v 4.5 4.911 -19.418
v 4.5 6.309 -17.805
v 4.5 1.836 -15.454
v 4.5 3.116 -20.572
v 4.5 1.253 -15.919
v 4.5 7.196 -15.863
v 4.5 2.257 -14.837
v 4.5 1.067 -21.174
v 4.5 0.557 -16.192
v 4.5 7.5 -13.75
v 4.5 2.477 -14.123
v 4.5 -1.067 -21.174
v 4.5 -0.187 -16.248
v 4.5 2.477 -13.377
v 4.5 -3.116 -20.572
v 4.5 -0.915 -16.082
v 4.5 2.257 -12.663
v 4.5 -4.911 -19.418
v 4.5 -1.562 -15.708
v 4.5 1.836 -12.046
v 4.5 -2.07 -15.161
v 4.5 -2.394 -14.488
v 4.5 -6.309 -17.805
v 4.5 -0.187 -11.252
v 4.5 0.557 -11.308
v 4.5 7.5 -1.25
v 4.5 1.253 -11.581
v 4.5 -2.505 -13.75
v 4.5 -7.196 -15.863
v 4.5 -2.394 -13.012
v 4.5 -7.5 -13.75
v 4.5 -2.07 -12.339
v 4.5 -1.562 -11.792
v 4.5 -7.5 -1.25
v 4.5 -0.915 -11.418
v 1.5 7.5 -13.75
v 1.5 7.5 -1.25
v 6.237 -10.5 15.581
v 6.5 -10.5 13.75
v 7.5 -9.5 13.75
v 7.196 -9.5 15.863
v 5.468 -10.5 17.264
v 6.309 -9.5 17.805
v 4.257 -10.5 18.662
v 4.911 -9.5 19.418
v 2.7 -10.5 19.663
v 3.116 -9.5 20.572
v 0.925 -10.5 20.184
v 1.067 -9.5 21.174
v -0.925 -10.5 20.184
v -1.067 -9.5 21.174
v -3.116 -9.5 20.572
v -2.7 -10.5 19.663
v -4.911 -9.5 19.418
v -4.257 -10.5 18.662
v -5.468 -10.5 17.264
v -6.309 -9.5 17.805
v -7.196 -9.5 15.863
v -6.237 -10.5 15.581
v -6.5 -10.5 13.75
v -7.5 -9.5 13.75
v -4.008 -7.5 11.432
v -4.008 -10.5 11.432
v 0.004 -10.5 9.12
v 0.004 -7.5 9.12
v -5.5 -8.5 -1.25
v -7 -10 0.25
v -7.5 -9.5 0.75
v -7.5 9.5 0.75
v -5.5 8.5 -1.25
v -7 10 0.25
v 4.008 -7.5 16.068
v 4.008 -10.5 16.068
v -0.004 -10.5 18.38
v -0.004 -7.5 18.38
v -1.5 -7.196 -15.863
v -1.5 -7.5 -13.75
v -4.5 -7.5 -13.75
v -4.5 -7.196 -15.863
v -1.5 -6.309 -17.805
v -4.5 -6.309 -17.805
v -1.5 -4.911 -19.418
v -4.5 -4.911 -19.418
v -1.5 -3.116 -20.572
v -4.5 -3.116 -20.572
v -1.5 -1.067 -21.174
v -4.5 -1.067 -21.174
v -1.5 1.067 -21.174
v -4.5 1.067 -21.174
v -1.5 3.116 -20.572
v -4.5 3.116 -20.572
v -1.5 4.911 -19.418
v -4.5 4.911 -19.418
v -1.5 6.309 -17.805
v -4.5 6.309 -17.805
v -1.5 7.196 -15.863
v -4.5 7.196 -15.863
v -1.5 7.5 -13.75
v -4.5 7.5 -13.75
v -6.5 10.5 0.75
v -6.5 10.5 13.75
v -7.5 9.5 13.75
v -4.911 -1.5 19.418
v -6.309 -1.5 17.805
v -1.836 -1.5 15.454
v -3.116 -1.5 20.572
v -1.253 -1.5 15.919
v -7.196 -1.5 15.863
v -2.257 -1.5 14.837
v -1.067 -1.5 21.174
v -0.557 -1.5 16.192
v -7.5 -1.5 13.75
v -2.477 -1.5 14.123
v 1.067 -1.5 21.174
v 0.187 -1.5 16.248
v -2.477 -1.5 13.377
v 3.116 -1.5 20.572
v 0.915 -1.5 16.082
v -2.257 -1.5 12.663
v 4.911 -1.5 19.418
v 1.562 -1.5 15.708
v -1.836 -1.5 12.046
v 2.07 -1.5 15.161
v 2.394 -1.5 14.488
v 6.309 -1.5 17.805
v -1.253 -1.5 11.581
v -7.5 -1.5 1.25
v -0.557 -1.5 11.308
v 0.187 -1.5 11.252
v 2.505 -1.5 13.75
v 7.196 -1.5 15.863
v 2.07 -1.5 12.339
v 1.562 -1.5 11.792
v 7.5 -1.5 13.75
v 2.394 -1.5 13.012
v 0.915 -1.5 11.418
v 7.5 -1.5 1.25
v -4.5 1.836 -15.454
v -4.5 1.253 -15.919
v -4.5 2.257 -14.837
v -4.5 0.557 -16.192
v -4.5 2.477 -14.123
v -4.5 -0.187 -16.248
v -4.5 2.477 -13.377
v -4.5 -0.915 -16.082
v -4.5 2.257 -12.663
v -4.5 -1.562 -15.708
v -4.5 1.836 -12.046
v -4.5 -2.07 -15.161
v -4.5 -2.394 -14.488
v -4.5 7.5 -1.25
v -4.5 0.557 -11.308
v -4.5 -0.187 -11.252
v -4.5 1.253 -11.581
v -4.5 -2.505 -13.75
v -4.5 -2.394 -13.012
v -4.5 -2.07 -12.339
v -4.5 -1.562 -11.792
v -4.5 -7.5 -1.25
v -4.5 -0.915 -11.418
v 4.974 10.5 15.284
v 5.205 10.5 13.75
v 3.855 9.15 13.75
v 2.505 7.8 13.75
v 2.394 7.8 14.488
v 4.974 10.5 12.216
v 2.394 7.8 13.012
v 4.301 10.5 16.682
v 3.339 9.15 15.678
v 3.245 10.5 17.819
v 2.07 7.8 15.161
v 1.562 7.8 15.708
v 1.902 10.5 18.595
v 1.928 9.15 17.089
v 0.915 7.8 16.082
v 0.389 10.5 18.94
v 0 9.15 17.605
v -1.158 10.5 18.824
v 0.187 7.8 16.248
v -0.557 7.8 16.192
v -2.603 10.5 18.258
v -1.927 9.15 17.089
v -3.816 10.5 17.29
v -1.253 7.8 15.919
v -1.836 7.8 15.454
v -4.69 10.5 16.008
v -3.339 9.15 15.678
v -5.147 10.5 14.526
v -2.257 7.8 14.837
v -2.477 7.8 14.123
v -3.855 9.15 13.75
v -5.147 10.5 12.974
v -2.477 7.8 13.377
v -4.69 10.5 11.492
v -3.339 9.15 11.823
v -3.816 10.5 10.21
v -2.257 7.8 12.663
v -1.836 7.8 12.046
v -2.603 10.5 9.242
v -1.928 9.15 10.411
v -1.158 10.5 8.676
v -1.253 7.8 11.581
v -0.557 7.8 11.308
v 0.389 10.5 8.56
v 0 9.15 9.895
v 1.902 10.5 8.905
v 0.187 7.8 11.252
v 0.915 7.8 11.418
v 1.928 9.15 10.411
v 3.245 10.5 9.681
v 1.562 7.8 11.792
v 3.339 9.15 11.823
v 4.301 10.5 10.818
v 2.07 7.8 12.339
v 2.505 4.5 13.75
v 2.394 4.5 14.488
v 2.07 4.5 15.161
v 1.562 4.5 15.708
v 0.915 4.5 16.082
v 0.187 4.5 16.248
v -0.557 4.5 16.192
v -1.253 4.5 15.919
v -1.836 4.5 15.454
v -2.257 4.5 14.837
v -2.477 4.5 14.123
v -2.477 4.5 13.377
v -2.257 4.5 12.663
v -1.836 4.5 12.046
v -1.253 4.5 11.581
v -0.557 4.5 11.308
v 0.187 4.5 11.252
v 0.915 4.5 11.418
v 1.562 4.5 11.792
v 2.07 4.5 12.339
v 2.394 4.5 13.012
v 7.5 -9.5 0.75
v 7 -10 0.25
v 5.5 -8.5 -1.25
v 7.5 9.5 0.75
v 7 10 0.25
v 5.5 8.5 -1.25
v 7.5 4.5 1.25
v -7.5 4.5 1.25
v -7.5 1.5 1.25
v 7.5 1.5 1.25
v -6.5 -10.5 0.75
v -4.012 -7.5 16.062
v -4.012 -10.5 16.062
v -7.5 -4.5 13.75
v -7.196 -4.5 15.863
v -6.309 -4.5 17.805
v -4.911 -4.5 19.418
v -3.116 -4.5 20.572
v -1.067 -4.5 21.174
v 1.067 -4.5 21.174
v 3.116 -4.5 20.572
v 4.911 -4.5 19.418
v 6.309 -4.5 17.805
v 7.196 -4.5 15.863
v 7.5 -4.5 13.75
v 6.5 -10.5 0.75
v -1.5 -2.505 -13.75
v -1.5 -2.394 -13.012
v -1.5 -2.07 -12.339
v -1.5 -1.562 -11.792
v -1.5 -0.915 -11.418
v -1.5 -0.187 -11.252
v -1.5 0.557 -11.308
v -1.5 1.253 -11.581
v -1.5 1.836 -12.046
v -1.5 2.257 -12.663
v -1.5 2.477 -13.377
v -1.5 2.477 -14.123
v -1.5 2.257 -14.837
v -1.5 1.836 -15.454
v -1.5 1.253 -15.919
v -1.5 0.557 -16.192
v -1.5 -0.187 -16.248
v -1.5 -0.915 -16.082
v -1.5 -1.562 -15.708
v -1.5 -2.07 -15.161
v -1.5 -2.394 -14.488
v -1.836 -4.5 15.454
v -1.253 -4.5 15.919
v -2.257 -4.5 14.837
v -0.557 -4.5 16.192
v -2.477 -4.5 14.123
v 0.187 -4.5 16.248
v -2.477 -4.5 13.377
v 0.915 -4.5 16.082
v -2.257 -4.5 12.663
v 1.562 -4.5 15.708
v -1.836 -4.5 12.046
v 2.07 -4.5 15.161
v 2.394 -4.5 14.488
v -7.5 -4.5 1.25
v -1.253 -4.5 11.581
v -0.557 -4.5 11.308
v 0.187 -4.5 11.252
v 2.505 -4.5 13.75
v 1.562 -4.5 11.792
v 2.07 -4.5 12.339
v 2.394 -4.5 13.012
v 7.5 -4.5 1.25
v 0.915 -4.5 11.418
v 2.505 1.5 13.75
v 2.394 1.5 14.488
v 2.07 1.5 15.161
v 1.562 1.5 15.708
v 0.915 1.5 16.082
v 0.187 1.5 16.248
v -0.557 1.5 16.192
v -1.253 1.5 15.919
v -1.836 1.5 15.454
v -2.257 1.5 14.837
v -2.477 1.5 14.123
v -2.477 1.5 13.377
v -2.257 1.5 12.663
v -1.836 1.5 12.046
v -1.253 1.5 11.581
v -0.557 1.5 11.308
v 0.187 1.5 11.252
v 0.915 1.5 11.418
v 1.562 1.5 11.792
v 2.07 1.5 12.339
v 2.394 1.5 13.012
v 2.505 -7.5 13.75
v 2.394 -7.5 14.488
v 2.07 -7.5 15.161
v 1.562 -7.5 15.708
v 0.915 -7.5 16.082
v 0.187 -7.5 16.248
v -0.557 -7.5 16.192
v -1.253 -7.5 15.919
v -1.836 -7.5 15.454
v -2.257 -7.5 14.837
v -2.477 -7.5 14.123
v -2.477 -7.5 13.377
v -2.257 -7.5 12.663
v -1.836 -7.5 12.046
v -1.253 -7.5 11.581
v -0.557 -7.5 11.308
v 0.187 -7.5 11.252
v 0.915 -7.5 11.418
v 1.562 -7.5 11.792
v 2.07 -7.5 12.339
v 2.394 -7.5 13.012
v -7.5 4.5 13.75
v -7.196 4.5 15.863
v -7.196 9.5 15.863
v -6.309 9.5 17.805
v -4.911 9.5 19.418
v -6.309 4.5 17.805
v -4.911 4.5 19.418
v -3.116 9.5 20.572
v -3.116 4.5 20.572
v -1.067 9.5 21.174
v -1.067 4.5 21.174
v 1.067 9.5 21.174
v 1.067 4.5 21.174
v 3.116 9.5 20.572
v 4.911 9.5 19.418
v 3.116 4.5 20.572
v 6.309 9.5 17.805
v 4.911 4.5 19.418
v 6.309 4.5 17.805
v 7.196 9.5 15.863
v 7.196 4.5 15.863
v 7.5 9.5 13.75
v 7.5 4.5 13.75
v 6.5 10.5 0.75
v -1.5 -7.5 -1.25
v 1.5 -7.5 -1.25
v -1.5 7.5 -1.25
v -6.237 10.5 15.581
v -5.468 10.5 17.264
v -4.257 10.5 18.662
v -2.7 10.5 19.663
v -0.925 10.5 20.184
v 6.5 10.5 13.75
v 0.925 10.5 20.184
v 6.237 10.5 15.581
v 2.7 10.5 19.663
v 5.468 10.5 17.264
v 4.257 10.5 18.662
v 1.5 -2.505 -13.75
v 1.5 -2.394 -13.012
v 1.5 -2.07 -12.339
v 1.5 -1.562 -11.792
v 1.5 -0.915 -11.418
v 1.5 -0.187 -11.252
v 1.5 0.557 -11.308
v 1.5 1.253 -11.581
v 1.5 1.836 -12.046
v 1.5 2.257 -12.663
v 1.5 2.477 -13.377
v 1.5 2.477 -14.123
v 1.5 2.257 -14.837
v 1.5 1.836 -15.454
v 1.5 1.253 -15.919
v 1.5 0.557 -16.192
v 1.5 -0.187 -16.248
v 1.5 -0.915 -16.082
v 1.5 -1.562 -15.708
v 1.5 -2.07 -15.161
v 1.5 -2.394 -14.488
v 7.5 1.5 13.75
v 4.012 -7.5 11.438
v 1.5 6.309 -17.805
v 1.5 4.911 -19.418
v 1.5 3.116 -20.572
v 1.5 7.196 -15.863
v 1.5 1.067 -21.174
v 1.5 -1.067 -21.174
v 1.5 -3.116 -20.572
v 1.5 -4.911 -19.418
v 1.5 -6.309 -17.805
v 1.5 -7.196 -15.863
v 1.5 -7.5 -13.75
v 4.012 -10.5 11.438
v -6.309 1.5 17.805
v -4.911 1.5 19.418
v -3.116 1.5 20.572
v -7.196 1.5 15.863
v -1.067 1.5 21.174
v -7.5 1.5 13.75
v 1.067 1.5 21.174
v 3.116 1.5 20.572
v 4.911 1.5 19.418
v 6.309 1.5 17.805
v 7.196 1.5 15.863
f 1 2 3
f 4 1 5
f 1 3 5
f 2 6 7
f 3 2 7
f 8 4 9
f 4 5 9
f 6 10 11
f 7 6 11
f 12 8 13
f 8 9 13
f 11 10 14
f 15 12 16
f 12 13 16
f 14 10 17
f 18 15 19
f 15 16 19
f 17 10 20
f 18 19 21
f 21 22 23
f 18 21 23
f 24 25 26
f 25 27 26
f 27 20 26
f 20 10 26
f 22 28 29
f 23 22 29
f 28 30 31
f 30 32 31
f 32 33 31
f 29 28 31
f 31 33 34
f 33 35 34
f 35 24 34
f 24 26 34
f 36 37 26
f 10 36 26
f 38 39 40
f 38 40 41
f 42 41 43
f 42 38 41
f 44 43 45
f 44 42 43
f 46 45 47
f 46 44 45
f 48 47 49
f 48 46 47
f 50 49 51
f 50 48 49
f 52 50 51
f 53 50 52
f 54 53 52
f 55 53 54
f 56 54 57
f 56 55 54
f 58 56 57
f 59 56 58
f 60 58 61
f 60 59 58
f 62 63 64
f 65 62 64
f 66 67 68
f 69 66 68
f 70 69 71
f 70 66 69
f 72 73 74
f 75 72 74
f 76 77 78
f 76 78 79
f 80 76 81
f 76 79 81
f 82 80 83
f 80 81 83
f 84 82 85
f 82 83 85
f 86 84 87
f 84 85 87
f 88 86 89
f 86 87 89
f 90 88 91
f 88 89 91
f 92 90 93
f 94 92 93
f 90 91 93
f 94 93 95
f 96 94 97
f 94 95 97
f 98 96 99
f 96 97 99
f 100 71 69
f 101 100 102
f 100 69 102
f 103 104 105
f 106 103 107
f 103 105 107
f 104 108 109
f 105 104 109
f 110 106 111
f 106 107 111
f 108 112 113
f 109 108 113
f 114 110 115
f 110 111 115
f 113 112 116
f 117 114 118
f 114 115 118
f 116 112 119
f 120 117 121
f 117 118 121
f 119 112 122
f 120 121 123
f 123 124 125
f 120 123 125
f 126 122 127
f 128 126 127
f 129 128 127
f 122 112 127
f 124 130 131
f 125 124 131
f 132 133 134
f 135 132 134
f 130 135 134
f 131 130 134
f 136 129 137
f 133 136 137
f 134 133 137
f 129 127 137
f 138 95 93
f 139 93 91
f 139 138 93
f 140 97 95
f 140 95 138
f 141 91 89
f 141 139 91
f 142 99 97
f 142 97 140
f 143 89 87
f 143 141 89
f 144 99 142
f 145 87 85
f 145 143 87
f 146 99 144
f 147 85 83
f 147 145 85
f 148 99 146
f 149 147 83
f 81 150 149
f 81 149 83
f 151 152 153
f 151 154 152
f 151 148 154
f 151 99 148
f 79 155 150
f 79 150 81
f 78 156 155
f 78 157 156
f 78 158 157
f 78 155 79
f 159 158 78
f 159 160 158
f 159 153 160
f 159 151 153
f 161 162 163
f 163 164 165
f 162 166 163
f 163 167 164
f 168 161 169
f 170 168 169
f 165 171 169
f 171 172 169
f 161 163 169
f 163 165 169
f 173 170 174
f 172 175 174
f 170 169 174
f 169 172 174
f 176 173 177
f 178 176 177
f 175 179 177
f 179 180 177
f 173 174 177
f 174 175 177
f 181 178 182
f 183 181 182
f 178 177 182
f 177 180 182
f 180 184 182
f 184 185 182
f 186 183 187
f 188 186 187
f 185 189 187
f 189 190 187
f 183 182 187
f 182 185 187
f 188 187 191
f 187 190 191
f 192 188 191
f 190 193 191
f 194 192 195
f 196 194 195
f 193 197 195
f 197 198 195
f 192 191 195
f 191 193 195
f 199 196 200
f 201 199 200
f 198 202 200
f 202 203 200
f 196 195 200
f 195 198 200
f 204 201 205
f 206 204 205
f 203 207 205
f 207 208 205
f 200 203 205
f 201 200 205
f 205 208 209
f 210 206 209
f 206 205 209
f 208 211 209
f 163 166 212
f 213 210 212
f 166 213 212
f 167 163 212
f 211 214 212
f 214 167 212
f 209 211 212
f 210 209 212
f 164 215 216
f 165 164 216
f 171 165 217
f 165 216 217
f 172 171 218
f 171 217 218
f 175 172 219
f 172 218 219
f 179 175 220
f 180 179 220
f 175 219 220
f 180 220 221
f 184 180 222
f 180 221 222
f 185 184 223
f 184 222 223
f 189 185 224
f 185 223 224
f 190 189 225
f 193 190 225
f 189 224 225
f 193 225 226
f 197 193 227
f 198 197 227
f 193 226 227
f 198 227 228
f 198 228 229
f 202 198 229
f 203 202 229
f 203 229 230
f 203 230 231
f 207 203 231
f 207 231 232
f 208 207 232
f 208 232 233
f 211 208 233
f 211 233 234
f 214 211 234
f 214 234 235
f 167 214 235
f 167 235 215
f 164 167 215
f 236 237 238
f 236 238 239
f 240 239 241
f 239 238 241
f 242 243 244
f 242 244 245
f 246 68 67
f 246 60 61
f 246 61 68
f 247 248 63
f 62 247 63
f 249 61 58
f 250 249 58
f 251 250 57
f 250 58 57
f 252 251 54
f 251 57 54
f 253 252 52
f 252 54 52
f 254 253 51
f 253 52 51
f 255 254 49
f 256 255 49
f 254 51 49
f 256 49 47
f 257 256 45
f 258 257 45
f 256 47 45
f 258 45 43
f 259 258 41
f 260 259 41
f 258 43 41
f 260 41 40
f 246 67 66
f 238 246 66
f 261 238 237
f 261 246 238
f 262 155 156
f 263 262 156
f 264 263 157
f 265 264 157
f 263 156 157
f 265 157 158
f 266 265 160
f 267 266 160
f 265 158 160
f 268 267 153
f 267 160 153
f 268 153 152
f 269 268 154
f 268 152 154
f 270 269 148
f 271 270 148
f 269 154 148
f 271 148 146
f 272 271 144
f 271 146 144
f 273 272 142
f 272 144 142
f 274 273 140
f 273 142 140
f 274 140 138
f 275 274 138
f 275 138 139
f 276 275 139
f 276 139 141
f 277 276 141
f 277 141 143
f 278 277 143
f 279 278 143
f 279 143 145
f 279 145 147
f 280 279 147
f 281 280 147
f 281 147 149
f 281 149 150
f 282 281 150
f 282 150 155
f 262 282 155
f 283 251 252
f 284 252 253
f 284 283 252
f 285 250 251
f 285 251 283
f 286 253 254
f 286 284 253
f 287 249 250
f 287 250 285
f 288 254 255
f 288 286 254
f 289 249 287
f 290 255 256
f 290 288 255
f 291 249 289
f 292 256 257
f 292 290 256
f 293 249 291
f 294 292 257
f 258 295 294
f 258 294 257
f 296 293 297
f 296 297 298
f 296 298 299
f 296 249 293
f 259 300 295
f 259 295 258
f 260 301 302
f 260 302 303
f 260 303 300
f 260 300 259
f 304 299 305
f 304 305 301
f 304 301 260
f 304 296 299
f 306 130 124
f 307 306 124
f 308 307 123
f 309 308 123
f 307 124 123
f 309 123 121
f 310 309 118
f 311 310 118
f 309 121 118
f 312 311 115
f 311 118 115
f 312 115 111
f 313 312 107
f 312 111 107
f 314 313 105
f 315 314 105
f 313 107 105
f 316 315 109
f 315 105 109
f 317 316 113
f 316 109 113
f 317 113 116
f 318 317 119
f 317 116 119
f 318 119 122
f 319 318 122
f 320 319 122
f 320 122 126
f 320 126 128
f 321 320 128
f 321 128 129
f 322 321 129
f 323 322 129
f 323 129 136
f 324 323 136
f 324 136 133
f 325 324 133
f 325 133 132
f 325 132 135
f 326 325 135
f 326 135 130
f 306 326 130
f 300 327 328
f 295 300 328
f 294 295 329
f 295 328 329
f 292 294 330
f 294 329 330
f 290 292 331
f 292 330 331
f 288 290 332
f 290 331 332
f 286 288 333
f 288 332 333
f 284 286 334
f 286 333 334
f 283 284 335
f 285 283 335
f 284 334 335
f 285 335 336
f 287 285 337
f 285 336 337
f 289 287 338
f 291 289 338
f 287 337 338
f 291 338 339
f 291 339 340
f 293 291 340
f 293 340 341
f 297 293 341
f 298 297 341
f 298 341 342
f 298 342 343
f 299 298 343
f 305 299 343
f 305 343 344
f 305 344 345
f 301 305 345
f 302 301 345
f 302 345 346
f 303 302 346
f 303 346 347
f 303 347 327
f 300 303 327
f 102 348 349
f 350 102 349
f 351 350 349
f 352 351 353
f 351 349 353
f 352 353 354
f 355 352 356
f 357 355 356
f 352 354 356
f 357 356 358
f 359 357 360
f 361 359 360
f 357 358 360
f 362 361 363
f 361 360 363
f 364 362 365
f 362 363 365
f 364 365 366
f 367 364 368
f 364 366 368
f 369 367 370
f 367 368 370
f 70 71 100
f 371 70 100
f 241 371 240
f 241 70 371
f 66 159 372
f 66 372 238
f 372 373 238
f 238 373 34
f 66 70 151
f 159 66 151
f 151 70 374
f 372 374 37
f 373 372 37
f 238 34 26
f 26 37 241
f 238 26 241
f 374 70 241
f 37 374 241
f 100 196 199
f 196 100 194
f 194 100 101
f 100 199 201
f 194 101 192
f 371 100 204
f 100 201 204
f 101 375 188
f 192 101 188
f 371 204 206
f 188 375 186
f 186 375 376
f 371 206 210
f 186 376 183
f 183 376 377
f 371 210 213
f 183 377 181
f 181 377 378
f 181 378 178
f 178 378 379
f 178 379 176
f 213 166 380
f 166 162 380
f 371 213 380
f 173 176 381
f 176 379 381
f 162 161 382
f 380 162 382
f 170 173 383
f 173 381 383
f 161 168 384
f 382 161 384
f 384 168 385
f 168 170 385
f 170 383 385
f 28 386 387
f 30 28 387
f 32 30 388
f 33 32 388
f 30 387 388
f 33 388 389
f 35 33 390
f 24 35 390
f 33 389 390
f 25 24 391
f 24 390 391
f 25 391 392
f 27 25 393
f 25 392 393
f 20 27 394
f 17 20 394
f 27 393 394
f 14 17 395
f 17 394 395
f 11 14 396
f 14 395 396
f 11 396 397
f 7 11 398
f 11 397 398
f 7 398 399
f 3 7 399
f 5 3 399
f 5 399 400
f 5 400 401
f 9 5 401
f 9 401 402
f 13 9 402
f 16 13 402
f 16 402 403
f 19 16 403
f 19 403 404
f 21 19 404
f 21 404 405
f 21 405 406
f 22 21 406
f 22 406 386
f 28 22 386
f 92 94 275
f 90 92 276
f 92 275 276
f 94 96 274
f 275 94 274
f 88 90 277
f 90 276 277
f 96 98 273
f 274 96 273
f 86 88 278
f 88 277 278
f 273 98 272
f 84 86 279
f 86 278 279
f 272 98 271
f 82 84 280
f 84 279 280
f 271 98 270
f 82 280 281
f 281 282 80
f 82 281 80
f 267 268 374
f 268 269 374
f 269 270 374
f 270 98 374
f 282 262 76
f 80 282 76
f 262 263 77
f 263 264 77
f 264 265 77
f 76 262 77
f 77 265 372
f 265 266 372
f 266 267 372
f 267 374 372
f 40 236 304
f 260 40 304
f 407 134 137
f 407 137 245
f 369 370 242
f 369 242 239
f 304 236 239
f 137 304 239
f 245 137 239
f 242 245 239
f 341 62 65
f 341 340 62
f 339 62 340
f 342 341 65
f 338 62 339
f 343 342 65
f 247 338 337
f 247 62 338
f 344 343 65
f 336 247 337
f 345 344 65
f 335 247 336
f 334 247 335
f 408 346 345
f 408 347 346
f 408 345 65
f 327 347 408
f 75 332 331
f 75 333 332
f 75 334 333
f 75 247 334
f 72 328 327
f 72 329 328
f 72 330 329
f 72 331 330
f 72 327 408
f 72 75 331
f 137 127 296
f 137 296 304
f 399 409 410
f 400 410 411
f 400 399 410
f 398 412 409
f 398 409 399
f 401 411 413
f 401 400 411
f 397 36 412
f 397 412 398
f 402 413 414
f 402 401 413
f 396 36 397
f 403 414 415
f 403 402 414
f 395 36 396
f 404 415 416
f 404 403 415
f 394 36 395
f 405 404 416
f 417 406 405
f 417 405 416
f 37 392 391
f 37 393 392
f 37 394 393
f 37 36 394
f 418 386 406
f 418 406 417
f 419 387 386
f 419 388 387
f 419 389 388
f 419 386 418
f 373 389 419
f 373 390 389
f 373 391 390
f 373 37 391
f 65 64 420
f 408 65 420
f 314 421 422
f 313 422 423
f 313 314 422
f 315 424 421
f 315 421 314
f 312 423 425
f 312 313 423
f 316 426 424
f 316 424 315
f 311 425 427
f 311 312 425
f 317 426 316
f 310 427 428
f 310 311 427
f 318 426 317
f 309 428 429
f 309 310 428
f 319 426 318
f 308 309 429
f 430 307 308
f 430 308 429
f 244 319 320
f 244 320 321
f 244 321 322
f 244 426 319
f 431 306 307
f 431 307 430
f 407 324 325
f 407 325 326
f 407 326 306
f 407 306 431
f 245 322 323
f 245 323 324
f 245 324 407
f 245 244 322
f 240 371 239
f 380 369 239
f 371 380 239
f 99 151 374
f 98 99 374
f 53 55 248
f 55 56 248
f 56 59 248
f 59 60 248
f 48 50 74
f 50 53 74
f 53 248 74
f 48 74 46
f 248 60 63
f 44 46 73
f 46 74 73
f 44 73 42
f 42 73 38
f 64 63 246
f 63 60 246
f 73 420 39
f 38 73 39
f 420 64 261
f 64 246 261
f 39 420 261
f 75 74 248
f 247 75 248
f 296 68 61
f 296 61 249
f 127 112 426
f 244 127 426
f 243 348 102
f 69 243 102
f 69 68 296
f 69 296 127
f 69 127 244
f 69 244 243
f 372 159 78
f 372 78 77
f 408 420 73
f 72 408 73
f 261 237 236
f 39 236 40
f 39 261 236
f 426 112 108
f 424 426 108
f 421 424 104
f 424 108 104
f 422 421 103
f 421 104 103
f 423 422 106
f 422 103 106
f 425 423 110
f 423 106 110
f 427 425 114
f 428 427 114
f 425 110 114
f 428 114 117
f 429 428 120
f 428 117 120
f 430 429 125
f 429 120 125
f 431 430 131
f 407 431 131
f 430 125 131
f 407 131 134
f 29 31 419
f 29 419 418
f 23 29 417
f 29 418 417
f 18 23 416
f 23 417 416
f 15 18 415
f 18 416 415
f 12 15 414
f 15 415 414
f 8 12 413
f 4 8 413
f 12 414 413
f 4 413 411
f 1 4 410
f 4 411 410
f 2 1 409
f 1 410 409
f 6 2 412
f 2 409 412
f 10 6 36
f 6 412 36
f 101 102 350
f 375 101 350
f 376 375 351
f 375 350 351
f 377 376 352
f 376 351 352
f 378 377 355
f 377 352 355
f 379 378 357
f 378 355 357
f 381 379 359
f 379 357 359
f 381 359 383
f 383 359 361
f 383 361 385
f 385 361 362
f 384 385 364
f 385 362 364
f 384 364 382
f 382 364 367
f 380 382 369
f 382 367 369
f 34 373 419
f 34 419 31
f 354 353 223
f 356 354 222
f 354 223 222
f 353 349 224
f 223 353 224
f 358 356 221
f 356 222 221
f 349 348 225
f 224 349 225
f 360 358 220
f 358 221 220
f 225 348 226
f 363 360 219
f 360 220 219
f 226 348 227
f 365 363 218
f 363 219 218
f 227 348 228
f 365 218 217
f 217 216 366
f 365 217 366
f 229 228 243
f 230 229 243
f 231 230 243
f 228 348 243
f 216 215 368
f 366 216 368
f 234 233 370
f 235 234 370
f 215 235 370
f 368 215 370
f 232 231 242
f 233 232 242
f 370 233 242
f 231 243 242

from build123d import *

# Parameters (mm, degrees)
F0_W      = 15
F0_H      = 21
F1_DEPTH  = 1.25
F2_W      = 15
F2_H      = 6
F2_H_2    = 3
F3_DEPTH  = 20
F4_W      = 3
F4_H      = 15
F5_DEPTH  = 20
F6_R      = 2.505
F7_DEPTH  = 25
F8_R      = 2.505
F9_DEPTH  = 25
F10_SIZE  = 2
F11_DEPTH = 3
F12_SIZE  = 2.7
F13_SIZE  = 1


with BuildPart() as f1:
    # F0 (on Top) → F1 (new body, symmetric)
    with BuildSketch(Plane.XY):
        Rectangle(F0_W, F0_H)
    extrude(amount=F1_DEPTH, both=True)

    # F2 (on face) → F3 (join)
    with BuildSketch(Plane.XY.offset(1.25)):
        with Locations((0, -7.5)):
            Rectangle(F2_W, F2_H)
        Rectangle(F2_W, F2_H_2)
        with Locations((0, 7.5)):
            Rectangle(F2_W, F2_H)
    extrude(amount=F3_DEPTH)

    # F4 (on face) → F5 (join)
    with BuildSketch(Plane(origin=(0, 0, -1.25), x_dir=(1, 0, 0), z_dir=(0, 0, -1))):
        with Locations((-3, 0)):
            Rectangle(F4_W, F4_H)
        with Locations((3, 0)):
            Rectangle(F4_W, F4_H)
    extrude(amount=F5_DEPTH)

    # F6 (on face) → F7 (cut)
    with BuildSketch(Plane.XZ.offset(10.5)):
        with BuildLine():
            ThreePointArc((0, 21.25), (5.3033008589, 19.0533008589), (7.5, 13.75))
            Line((7.5, 13.75), (7.5, 21.25))
            Line((7.5, 21.25), (0, 21.25))
        make_face()
        with BuildLine():
            ThreePointArc((-7.5, 13.75), (-5.3033008589, 19.0533008589), (0, 21.25))
            Line((0, 21.25), (-7.5, 21.25))
            Line((-7.5, 21.25), (-7.5, 13.75))
        make_face()
        with Locations((0, 13.75)):
            Circle(F6_R)
    extrude(amount=-F7_DEPTH, mode=Mode.SUBTRACT)

    # F8 (on face) → F9 (cut)
    with BuildSketch(Plane(origin=(-4.5, 0, 0), x_dir=(0, -1, 0), z_dir=(-1, 0, 0))):
        with BuildLine():
            Line((7.5, -21.25), (7.5, -13.75))
            ThreePointArc((7.5, -13.75), (5.3033008589, -19.0533008589), (0, -21.25))
            Line((0, -21.25), (7.5, -21.25))
        make_face()
        with BuildLine():
            ThreePointArc((0, -21.25), (-5.3033008589, -19.0533008589), (-7.5, -13.75))
            Line((-7.5, -13.75), (-7.5, -21.25))
            Line((-7.5, -21.25), (0, -21.25))
        make_face()
        with Locations((0, -13.75)):
            Circle(F8_R)
    extrude(amount=-F9_DEPTH, mode=Mode.SUBTRACT)

    # F10
    f10_edges = [f1.edges().sort_by_distance(p)[0] for p in [
        (-7.5, 0, -1.25),
        (0, 10.5, -1.25),
        (0, -10.5, -1.25),
        (7.5, 0, -1.25),
    ]]
    chamfer(f10_edges, length=F10_SIZE)

    # F6 (on face) → F11 (cut)
    with BuildSketch(Plane.XZ.offset(10.5)):
        Polygon((4.0080889509, 16.0684814631), (-0.0038193698, 18.3803475837), (-4.0119083207, 16.0618661206), (-4.0080889509, 11.4315185369), (0.0038193698, 9.1196524163), (4.0119083207, 11.4381338794), align=None)
        with Locations((0, 13.75)):
            Circle(F6_R, mode=Mode.SUBTRACT)
    extrude(amount=-F11_DEPTH, mode=Mode.SUBTRACT)

    # F12
    f12_edges = [f1.edges().sort_by_distance(p)[0] for p in [
        (-2.505, 10.5, 13.75),
    ]]
    chamfer(f12_edges, length=F12_SIZE)

    # F13
    f13_edges = [f1.edges().sort_by_distance(p)[0] for p in [
        (0, 10.5, 21.25),
        (7.5, 10.5, 7.25),
        (-7.5, 10.5, 7.25),
        (7.5, -10.5, 7.25),
        (-7.5, -10.5, 7.25),
        (0, -10.5, 21.25),
    ]]
    chamfer(f13_edges, length=F13_SIZE)


solid = f1.part
